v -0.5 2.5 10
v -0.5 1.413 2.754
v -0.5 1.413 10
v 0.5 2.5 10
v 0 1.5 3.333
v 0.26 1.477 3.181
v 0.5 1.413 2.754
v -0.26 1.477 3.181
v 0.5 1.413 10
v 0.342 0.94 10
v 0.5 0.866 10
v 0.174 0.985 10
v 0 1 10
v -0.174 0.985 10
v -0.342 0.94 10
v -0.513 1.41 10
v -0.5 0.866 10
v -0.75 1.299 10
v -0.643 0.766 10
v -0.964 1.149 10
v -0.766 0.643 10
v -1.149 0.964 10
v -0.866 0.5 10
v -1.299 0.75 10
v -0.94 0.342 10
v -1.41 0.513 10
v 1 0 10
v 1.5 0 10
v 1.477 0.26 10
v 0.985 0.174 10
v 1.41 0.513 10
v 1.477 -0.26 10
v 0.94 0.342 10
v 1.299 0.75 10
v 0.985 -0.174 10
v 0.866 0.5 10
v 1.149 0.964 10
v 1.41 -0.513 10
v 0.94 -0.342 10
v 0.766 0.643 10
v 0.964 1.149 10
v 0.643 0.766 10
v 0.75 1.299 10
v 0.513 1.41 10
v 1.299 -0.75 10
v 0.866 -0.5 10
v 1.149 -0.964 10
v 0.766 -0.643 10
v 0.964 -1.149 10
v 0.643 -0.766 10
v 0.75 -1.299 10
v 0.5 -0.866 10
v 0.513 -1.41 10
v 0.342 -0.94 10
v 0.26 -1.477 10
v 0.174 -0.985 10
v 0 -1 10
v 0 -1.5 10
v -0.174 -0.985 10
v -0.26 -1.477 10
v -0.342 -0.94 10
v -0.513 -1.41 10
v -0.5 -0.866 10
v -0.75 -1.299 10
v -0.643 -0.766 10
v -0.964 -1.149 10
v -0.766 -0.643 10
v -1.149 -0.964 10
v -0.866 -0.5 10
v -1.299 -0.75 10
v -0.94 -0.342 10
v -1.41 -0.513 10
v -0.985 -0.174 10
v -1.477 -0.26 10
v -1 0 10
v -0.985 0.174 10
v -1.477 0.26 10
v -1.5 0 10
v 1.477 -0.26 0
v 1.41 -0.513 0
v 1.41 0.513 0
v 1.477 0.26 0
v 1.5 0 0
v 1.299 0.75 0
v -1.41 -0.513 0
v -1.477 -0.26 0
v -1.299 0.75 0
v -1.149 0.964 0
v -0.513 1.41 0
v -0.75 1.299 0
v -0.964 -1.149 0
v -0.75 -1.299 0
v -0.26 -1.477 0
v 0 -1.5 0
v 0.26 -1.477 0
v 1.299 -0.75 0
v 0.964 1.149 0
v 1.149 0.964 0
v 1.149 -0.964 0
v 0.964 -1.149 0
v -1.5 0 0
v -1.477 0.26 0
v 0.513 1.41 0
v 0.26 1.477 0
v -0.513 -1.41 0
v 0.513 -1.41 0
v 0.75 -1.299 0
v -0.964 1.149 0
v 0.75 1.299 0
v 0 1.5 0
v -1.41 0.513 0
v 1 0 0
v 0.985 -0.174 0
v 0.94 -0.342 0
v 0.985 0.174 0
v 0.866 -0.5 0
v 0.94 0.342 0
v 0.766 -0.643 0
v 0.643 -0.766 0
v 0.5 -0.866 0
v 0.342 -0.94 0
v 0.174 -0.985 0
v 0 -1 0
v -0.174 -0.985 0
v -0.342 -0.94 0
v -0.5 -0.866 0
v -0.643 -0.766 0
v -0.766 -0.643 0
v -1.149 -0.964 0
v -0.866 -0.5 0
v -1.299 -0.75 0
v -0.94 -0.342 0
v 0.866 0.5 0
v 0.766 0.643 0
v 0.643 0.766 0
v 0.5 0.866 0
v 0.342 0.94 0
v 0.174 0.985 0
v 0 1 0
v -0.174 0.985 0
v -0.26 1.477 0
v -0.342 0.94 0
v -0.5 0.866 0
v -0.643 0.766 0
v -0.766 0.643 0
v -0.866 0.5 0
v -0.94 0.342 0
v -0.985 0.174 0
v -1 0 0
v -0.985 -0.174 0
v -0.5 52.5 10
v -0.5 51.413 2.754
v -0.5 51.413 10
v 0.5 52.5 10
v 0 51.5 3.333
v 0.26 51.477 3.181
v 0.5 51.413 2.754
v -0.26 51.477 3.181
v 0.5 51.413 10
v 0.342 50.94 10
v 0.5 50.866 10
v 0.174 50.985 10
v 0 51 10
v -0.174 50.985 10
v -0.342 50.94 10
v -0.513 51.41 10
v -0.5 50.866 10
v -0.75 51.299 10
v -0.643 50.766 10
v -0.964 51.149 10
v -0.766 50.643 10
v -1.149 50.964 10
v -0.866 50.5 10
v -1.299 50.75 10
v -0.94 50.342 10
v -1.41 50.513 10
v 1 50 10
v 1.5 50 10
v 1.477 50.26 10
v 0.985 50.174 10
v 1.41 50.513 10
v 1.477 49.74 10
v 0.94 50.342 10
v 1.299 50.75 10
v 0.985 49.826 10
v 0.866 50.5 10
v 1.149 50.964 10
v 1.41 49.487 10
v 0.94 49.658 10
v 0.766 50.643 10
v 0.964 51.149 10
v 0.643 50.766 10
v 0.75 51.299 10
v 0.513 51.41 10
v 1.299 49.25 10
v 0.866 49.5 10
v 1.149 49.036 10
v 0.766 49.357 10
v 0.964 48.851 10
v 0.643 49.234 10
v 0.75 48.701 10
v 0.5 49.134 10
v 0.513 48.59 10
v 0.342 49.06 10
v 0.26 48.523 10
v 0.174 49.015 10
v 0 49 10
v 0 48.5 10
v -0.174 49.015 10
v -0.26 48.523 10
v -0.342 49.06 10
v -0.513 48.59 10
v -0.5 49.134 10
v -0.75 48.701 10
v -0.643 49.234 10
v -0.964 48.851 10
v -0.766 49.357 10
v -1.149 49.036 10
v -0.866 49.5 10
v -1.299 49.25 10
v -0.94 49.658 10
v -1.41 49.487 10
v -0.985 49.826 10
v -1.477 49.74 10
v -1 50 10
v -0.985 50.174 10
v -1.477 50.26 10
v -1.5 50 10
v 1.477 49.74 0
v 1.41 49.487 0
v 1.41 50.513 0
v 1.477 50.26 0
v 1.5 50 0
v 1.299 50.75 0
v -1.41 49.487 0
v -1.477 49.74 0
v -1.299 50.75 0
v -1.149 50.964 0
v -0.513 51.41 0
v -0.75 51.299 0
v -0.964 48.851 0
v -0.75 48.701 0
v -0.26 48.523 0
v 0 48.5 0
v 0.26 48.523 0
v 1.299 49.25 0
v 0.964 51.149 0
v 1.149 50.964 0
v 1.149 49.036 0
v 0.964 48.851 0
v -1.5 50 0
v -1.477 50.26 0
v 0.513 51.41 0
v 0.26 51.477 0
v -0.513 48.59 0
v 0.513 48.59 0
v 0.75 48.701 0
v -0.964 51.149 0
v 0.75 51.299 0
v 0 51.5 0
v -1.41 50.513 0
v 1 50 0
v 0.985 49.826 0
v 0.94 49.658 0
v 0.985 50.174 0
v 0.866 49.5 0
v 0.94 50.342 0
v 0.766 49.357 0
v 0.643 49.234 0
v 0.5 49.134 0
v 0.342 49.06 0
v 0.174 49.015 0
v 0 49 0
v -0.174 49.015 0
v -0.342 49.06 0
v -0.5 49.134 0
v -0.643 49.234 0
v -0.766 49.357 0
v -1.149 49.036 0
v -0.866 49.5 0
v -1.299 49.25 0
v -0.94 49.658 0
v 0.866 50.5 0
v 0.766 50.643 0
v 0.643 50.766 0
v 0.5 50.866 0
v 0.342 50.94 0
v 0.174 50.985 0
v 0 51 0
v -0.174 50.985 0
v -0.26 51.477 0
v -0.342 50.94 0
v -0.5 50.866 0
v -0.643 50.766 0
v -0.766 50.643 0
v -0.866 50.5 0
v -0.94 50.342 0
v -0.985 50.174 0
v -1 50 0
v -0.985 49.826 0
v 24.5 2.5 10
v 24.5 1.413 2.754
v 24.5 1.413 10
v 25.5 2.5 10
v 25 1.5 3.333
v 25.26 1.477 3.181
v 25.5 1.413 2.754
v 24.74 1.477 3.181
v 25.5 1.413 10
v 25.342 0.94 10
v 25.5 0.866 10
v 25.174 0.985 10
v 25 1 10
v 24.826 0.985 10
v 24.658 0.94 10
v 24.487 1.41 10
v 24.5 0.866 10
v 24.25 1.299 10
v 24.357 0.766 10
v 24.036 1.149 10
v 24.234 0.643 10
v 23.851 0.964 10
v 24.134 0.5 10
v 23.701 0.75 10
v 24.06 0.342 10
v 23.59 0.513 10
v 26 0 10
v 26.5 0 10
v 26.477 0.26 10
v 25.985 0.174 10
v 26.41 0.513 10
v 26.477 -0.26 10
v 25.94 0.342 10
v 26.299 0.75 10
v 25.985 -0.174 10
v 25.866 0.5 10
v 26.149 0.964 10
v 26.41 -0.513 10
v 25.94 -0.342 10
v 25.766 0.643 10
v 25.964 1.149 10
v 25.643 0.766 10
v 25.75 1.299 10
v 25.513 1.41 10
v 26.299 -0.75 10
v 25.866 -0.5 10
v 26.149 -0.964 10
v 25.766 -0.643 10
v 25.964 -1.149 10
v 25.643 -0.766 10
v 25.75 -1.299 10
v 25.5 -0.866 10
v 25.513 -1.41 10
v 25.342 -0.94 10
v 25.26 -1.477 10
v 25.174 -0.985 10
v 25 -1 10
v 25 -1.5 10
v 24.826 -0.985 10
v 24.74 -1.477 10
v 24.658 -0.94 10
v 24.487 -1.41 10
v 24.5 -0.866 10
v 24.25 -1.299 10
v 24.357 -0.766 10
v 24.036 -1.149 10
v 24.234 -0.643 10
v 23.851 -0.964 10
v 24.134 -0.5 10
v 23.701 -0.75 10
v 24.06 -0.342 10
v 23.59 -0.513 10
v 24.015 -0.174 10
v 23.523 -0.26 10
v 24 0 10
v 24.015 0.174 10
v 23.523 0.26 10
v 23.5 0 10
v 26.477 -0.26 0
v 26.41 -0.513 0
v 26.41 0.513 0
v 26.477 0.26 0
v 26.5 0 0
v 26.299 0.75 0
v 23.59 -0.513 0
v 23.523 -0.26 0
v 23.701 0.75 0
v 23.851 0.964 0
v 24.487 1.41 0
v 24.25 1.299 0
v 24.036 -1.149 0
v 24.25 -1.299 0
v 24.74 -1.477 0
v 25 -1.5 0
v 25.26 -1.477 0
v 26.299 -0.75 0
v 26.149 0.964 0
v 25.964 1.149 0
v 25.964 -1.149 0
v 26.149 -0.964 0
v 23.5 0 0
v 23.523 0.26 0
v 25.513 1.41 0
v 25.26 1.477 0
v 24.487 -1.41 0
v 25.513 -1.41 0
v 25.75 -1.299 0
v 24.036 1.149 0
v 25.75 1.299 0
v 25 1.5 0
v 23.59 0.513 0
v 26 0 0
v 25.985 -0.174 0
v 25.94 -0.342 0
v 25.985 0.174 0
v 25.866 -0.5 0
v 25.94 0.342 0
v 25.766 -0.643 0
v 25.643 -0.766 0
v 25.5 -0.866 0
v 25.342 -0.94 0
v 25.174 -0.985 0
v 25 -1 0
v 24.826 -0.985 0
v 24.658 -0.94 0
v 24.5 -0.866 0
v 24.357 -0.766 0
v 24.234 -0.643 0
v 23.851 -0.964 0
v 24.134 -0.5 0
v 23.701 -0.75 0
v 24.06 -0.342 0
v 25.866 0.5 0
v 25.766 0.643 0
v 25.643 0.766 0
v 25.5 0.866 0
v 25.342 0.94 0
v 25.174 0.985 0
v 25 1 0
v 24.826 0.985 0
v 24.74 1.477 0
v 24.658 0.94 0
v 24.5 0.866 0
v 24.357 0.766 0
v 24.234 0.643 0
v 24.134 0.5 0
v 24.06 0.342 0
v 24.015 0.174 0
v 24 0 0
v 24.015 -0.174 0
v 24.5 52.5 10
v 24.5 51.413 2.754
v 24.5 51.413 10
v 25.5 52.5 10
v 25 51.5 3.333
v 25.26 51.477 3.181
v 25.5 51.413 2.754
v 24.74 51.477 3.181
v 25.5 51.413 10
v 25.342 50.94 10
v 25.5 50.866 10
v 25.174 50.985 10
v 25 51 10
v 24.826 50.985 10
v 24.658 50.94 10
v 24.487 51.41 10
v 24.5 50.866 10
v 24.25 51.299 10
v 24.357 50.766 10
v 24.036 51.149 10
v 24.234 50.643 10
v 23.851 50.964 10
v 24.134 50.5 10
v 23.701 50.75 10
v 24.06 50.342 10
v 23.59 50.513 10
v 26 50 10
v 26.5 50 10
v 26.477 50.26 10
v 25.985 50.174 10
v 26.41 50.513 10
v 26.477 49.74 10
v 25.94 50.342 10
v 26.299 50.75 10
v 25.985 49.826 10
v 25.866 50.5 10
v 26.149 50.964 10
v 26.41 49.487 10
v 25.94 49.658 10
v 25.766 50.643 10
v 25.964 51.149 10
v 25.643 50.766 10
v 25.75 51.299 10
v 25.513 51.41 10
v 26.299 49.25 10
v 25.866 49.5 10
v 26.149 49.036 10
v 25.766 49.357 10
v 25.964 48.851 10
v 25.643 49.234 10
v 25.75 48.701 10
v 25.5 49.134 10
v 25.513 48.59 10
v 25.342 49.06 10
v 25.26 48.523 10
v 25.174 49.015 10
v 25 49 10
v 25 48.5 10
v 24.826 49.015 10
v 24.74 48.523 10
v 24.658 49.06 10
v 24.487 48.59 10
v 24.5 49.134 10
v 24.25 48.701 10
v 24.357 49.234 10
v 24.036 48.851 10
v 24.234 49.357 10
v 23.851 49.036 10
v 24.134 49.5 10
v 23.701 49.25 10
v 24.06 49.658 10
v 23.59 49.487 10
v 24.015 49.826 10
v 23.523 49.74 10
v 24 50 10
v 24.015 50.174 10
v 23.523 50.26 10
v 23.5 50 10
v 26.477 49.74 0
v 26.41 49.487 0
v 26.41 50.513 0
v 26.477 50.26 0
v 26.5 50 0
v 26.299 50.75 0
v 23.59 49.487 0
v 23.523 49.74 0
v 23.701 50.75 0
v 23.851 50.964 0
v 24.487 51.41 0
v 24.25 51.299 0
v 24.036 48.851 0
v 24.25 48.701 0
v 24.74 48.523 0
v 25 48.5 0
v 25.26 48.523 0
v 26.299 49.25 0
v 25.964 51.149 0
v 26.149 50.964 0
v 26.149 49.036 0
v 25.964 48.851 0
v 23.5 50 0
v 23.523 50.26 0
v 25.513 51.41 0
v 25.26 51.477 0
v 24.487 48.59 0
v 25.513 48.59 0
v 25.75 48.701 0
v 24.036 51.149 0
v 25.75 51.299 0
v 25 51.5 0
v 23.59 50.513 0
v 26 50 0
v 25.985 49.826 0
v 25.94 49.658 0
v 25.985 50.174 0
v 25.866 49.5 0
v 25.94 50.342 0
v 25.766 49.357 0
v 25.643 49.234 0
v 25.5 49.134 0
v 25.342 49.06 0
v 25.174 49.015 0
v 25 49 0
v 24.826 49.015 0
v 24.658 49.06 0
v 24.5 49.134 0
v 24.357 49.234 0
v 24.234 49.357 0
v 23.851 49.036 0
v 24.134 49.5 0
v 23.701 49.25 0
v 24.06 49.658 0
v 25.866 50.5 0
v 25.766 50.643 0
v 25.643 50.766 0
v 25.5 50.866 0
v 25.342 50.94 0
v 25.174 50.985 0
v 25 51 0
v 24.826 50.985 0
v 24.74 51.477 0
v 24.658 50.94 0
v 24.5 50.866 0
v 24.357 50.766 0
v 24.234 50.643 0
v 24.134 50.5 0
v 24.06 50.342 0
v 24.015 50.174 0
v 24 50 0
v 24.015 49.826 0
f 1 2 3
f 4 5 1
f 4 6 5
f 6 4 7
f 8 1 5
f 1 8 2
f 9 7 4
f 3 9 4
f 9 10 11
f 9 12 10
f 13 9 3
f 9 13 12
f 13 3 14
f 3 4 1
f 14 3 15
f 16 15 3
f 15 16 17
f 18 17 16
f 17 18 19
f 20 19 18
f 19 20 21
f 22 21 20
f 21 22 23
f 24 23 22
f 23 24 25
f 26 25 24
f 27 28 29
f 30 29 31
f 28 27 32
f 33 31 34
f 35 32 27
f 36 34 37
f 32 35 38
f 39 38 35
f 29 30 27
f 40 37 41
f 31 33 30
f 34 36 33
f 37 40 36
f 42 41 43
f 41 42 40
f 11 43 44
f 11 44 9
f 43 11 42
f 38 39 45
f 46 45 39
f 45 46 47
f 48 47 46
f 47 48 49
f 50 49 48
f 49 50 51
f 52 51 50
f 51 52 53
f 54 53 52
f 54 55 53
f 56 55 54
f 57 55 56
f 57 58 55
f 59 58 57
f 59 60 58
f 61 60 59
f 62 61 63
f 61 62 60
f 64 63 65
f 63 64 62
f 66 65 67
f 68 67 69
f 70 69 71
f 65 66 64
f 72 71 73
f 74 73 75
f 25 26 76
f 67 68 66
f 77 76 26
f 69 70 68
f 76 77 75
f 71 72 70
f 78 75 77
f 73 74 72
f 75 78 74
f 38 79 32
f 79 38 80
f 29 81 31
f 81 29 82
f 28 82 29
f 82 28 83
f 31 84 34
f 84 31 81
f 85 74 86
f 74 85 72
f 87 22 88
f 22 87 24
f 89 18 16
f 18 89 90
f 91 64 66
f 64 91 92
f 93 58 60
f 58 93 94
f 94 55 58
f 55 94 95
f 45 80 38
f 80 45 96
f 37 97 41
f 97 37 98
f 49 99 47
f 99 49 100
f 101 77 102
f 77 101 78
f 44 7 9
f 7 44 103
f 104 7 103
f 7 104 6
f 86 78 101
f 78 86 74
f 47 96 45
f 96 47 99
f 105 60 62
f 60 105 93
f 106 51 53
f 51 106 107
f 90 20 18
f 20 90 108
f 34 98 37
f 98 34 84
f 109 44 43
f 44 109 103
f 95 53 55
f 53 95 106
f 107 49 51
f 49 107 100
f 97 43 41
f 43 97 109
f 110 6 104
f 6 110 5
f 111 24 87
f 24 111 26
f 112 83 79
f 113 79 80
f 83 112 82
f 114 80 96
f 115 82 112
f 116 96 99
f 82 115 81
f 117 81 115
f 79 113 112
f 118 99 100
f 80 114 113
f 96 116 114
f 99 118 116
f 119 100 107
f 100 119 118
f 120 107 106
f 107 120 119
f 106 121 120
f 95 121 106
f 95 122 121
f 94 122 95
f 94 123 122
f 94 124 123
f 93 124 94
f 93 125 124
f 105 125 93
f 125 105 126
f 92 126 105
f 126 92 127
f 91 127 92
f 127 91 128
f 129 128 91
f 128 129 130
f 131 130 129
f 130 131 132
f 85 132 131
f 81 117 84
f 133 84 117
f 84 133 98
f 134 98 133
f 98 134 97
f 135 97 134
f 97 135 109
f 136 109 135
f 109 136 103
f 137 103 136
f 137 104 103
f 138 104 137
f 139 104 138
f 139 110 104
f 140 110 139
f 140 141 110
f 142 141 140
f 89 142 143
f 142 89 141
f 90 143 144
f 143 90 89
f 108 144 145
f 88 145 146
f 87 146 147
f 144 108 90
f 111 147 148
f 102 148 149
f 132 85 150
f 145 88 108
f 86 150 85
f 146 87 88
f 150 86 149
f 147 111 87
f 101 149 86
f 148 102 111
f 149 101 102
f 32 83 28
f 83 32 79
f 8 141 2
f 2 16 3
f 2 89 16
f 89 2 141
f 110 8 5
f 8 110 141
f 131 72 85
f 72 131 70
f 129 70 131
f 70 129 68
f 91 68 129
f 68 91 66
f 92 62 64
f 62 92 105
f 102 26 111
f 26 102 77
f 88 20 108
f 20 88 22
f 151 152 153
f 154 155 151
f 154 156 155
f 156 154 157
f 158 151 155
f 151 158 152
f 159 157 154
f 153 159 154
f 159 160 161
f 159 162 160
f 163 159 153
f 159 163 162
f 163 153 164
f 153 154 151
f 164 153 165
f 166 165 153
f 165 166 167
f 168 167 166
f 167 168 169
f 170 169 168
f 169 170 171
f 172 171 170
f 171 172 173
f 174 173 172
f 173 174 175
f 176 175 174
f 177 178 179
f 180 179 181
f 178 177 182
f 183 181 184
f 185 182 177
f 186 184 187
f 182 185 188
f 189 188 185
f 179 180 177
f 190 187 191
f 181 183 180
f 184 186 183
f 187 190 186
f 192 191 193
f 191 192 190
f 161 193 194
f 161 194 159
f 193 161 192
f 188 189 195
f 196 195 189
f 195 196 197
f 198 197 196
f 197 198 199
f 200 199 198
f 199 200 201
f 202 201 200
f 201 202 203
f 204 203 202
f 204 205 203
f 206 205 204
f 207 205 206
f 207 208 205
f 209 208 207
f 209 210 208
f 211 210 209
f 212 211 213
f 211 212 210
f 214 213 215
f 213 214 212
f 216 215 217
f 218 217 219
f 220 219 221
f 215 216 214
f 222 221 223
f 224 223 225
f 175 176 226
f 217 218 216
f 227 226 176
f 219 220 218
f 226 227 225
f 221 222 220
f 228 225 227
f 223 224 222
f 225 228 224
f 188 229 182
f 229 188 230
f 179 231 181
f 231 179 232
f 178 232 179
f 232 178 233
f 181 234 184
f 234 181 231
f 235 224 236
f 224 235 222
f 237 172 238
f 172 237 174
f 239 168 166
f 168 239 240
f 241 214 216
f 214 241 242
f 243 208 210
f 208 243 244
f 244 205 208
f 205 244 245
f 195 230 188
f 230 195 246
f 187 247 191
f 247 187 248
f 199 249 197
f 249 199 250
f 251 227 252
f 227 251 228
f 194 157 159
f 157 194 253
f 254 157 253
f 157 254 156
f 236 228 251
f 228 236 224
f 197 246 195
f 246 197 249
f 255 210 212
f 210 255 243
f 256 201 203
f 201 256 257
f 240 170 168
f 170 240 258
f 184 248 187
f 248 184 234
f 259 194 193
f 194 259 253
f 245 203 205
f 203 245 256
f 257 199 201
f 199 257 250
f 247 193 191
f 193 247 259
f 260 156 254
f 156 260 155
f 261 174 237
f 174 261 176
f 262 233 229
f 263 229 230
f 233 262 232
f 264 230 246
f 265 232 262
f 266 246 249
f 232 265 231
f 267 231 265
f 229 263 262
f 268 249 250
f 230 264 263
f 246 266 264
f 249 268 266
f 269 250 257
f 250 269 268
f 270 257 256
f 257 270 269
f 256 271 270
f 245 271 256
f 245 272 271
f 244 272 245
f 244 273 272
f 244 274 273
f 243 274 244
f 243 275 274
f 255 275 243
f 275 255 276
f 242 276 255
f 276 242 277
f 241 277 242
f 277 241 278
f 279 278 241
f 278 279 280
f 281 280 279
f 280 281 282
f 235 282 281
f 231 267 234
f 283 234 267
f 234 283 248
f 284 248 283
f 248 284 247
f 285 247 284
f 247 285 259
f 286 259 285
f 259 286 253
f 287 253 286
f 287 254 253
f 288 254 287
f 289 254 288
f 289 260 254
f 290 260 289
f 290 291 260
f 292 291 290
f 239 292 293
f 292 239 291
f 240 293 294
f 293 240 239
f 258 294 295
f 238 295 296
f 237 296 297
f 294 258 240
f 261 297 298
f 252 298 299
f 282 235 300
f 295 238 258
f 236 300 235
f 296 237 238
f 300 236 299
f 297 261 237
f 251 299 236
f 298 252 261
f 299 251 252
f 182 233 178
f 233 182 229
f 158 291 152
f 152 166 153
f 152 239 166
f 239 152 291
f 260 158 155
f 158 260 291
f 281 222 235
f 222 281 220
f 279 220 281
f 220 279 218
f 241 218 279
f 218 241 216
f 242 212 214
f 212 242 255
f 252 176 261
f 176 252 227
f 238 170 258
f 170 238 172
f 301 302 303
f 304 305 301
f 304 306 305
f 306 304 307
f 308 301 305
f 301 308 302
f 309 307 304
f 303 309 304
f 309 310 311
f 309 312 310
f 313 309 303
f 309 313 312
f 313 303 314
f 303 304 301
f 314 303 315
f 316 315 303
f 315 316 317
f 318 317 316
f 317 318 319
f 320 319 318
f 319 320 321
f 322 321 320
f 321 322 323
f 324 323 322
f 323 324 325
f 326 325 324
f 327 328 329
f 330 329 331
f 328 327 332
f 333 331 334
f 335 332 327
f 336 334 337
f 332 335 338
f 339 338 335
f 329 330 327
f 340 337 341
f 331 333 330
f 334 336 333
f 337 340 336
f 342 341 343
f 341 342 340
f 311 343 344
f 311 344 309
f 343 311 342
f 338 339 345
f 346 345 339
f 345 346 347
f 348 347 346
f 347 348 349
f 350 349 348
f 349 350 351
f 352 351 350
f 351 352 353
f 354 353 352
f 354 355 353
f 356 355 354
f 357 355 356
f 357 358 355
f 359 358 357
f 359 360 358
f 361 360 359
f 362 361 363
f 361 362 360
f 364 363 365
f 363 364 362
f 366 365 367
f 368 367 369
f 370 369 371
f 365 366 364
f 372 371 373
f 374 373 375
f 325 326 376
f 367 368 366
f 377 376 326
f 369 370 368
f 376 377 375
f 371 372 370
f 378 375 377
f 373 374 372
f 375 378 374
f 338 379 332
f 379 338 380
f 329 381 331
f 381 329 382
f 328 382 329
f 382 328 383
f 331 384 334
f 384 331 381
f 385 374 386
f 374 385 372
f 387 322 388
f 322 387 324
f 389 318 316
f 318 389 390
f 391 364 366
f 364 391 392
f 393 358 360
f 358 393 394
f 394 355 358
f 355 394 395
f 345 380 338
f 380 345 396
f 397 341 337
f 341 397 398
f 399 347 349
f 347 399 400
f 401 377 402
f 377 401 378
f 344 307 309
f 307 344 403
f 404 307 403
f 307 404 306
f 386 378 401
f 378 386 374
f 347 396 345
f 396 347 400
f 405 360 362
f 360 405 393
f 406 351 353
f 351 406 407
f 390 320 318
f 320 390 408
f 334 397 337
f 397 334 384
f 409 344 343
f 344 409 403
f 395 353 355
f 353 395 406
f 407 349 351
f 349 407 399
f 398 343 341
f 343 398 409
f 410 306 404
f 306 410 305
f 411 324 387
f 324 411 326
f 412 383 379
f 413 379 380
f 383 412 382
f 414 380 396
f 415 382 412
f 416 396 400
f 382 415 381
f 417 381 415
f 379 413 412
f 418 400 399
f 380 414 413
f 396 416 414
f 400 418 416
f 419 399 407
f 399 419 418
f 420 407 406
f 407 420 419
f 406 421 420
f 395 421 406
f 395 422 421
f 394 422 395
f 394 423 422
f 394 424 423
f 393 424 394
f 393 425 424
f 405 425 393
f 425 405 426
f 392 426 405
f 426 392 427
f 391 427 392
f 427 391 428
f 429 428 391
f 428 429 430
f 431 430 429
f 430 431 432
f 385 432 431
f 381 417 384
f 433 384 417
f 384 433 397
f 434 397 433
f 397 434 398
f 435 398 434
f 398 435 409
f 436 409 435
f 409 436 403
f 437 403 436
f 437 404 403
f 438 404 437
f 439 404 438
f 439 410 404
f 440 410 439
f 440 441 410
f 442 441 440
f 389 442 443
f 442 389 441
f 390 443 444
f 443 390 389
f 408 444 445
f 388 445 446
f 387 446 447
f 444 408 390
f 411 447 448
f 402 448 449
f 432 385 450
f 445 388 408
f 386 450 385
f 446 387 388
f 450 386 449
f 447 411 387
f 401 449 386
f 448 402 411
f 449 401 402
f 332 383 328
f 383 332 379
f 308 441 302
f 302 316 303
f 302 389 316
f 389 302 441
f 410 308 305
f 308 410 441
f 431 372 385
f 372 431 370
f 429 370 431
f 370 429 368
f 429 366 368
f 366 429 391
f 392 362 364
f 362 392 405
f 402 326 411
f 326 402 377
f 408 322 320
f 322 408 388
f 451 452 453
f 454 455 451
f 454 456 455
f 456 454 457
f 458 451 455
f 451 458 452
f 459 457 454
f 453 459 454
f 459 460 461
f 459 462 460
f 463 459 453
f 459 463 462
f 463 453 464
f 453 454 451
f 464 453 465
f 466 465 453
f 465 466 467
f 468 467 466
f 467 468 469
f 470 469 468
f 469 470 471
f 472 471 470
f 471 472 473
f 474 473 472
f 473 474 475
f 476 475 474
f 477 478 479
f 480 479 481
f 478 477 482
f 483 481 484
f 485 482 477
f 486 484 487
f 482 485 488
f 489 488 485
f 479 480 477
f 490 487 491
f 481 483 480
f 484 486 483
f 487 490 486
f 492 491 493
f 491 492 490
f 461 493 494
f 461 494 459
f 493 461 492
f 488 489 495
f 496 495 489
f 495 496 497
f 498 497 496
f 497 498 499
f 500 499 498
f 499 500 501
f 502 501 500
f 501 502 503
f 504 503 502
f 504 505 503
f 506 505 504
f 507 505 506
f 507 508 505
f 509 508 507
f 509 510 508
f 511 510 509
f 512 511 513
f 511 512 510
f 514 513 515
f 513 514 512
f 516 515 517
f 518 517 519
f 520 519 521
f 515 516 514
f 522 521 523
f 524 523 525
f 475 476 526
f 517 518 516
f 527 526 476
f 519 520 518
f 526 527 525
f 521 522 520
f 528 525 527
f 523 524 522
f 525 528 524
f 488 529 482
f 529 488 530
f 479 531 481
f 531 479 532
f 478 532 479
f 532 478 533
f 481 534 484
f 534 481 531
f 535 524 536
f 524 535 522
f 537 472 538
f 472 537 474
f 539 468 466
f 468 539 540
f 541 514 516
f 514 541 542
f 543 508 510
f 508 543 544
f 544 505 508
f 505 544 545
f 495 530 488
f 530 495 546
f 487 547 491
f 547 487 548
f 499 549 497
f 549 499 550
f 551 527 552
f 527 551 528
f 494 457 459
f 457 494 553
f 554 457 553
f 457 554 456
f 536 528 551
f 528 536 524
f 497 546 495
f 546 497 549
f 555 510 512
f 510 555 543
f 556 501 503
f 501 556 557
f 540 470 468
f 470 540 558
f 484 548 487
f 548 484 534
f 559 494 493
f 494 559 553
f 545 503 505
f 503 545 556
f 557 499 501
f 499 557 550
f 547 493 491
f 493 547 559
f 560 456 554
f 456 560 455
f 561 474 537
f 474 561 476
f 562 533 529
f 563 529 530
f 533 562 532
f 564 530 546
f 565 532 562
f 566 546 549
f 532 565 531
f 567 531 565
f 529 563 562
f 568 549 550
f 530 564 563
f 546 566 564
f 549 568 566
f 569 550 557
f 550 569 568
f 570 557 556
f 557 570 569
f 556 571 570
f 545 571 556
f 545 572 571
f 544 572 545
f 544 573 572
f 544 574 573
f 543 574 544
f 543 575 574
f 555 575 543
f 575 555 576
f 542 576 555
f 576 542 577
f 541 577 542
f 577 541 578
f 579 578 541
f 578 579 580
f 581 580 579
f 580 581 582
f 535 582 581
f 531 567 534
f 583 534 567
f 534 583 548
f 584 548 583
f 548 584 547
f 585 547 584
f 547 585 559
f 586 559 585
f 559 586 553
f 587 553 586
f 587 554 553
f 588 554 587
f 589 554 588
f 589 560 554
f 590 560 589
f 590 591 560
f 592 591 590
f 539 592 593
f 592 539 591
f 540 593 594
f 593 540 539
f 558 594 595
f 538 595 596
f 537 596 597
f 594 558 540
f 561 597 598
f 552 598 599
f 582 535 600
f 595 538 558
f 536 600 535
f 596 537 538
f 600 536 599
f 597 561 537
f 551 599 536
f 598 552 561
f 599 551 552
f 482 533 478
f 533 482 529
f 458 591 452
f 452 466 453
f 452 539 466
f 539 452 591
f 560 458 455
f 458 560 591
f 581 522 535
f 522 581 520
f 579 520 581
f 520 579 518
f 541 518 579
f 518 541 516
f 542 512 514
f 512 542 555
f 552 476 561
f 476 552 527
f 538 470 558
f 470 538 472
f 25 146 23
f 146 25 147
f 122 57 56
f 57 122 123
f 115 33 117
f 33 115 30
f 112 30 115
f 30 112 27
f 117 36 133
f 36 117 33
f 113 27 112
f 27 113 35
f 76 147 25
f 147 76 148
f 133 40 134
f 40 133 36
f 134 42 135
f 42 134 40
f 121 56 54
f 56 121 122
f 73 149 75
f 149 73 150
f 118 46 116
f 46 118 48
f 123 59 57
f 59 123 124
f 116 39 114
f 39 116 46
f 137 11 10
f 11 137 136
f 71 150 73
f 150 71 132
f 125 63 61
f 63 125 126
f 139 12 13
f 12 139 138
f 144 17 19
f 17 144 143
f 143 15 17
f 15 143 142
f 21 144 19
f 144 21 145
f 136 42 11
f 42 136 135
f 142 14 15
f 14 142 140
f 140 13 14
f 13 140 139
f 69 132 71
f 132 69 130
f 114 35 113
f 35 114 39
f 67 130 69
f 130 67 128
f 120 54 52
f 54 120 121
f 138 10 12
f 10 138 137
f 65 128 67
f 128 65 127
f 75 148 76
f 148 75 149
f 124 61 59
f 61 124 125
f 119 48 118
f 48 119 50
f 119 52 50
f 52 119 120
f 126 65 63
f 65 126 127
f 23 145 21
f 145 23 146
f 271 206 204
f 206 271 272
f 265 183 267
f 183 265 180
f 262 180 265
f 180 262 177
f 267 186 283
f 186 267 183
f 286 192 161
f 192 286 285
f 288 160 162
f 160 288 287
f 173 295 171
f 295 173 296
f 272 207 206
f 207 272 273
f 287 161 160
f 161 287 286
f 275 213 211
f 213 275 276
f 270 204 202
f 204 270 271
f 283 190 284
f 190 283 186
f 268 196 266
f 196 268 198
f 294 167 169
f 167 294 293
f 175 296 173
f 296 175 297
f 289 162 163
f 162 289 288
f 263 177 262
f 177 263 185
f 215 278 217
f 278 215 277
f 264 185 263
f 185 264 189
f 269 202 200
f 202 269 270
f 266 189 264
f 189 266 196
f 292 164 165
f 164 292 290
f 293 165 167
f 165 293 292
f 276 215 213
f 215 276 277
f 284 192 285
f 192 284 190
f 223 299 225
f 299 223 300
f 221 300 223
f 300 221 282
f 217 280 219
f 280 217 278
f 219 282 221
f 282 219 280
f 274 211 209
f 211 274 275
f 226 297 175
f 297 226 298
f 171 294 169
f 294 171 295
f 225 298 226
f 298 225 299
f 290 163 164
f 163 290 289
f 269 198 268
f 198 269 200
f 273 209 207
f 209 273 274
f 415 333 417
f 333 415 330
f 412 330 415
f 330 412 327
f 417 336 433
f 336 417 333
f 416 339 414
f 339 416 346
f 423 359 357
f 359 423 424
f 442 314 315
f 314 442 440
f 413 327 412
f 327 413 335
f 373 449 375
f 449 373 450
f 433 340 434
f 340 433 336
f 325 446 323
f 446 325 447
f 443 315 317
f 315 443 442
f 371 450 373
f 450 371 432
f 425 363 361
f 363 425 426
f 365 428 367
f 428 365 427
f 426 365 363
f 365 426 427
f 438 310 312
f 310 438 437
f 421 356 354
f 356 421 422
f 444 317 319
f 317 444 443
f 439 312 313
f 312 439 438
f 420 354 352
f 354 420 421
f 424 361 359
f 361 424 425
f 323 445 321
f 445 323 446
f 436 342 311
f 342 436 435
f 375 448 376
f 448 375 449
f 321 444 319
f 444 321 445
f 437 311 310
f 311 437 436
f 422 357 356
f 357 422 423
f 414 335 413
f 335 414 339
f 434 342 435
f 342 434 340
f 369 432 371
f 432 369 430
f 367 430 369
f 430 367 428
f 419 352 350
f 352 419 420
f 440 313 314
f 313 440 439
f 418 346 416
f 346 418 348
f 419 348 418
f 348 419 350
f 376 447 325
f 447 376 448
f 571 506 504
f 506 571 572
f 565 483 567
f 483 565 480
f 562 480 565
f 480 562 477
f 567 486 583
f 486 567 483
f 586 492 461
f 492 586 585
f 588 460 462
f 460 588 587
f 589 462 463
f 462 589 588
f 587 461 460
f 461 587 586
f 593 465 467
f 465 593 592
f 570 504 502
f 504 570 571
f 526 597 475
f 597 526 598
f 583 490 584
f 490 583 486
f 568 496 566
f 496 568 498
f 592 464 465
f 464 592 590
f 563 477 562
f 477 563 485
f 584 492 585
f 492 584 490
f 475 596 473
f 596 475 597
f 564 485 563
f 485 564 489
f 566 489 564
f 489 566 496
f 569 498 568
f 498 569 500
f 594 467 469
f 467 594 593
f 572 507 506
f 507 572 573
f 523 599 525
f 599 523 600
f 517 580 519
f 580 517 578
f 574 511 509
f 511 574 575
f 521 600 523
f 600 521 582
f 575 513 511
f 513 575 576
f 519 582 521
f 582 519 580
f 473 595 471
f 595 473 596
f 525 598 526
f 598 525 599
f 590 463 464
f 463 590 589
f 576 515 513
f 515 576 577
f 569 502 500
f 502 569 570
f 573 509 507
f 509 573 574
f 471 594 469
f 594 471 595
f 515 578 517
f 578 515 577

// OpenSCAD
/* Developed by Alex Grutter */

$fn = 36;

four_posts_with_supports(10, 3, 2, 25, 50, 5, 1, [0,0,0,0], 1, true);

module four_posts(post_height, post_outer_diameter, post_inner_diameter, post_spacing_width, post_spacing_length){
    difference()
    {
		/* Outer part */
		union()
		{
            translate([0, 0, 0])
            {
                cylinder(h = post_height, d = post_outer_diameter);
            }
            translate([0, post_spacing_length + 0, 0])
            {
                cylinder(h = post_height, d = post_outer_diameter);
            }
            translate([post_spacing_width + 0, 0, 0])
            {
                cylinder(h = post_height, d = post_outer_diameter);
            }
            translate([post_spacing_width + 0, post_spacing_length + 0, 0])
            {
                cylinder(h = post_height, d = post_outer_diameter);
            }
		}
		/* Inner hole */
        union()
        {
            translate([0, 0, -1])
            {
                cylinder(h = post_height+2, d = post_inner_diameter);
            }
            translate([0, post_spacing_length + 0, -1])
            {
                cylinder(h = post_height+2, d = post_inner_diameter);
            }
            translate([post_spacing_width + 0, 0, -1])
            {
                cylinder(h = post_height+2, d = post_inner_diameter);
            }
            translate([post_spacing_width + 0, post_spacing_length + 0, -1])
            {
                cylinder(h = post_height+2, d = post_inner_diameter);
            }
        }
	}
};

module four_posts_with_supports(post_height, post_outer_diameter, post_inner_diameter, post_spacing_width, post_spacing_length, support_diameter, support_count, support_start_angle, support_thickness, flip){
    difference()
    {
		/* Outer part */
		union()
		{
            translate([0, 0, 0])
            {
                cylinder(h = post_height, d = post_outer_diameter);
				for(support = [0 : support_count])
				{
					if(flip)
					{
						translate([0, 0, post_height])
						rotate([support_start_angle[0] + ( support * (360 / support_count)),90,0])
						translate([0, 0, -(support_thickness / 2)])
						linear_extrude(support_thickness)
						polygon([[post_height, (post_inner_diameter / 2)],[0, (post_inner_diameter / 2)],[0,(support_diameter / 2)]], [[0,1,2]]);
					}
					else
					{
						rotate([support_start_angle[0] + ( support * (360 / support_count)),-90,0])
						translate([0, 0, -(support_thickness / 2)])
						linear_extrude(support_thickness)
						polygon([[post_height, (post_inner_diameter / 2)],[0, (post_inner_diameter / 2)],[0, (support_diameter / 2)]], [[0,1,2]]);
					}
				}
            }
            translate([0, post_spacing_length + 0, 0])
            {
                cylinder(h = post_height, d = post_outer_diameter);
				for(support = [0 : support_count])
				{
					if(flip)
					{
						translate([0, 0, post_height])
						rotate([support_start_angle[1] + ( support * (360 / support_count)),90,0])
						translate([0, 0, -(support_thickness / 2)])
						linear_extrude(support_thickness)
						polygon([[post_height, (post_inner_diameter / 2)],[0, (post_inner_diameter / 2)],[0,(support_diameter / 2)]], [[0,1,2]]);
					}
					else
					{
						rotate([support_start_angle[1] + ( support * (360 / support_count)),-90,0])
						translate([0, 0, -(support_thickness / 2)])
						linear_extrude(support_thickness)
						polygon([[post_height, (post_inner_diameter / 2)],[0, (post_inner_diameter / 2)],[0,(support_diameter / 2)]], [[0,1,2]]);
					}
				}
            }
            translate([post_spacing_width + 0, 0, 0])
            {
                cylinder(h = post_height, d = post_outer_diameter);
				for(support = [0 : support_count])
				{
					if(flip)
					{
						translate([0, 0, post_height])
						rotate([support_start_angle[2] + ( support * (360 / support_count)),90,0])
						translate([0, 0, -(support_thickness / 2)])
						linear_extrude(support_thickness)
						polygon([[post_height, (post_inner_diameter / 2)],[0, (post_inner_diameter / 2)],[0,(support_diameter / 2)]], [[0,1,2]]);
					}
					else
					{
						rotate([support_start_angle[2] + ( support * (360 / support_count)),-90,0])
						translate([0, 0, -(support_thickness / 2)])
						linear_extrude(support_thickness)
						polygon([[post_height, (post_inner_diameter / 2)],[0, (post_inner_diameter / 2)],[0,(support_diameter / 2)]], [[0,1,2]]);
					}
				}
            }
            translate([post_spacing_width + 0, post_spacing_length + 0, 0])
            {
                cylinder(h = post_height, d = post_outer_diameter);
				for(support = [0 : support_count])
				{
					if(flip)
					{
						translate([0, 0, post_height])
						rotate([support_start_angle[3] + ( support * (360 / support_count)),90,0])
						translate([0, 0, -(support_thickness / 2)])
						linear_extrude(support_thickness)
						polygon([[post_height, (post_inner_diameter / 2)],[0, (post_inner_diameter / 2)],[0,(support_diameter / 2)]], [[0,1,2]]);
					}
					else
					{
						rotate([support_start_angle[3] + ( support * (360 / support_count)),-90,0])
						translate([0, 0, -(support_thickness / 2)])
						linear_extrude(support_thickness)
						polygon([[post_height, (post_inner_diameter / 2)],[0, (post_inner_diameter / 2)],[0,(support_diameter / 2)]], [[0,1,2]]);
					}
				}
            }
		}
        
		/* Inner hole */
        union()
        {
            translate([0, 0, -1])
            {
                cylinder(h = post_height+2, d = post_inner_diameter);
            }
            translate([0, post_spacing_length + 0, -1])
            {
                cylinder(h = post_height+2, d = post_inner_diameter);
            }
            translate([post_spacing_width + 0, 0, -1])
            {
                cylinder(h = post_height+2, d = post_inner_diameter);
            }
            translate([post_spacing_width + 0, post_spacing_length + 0, -1])
            {
                cylinder(h = post_height+2, d = post_inner_diameter);
            }
        }
	}
};
